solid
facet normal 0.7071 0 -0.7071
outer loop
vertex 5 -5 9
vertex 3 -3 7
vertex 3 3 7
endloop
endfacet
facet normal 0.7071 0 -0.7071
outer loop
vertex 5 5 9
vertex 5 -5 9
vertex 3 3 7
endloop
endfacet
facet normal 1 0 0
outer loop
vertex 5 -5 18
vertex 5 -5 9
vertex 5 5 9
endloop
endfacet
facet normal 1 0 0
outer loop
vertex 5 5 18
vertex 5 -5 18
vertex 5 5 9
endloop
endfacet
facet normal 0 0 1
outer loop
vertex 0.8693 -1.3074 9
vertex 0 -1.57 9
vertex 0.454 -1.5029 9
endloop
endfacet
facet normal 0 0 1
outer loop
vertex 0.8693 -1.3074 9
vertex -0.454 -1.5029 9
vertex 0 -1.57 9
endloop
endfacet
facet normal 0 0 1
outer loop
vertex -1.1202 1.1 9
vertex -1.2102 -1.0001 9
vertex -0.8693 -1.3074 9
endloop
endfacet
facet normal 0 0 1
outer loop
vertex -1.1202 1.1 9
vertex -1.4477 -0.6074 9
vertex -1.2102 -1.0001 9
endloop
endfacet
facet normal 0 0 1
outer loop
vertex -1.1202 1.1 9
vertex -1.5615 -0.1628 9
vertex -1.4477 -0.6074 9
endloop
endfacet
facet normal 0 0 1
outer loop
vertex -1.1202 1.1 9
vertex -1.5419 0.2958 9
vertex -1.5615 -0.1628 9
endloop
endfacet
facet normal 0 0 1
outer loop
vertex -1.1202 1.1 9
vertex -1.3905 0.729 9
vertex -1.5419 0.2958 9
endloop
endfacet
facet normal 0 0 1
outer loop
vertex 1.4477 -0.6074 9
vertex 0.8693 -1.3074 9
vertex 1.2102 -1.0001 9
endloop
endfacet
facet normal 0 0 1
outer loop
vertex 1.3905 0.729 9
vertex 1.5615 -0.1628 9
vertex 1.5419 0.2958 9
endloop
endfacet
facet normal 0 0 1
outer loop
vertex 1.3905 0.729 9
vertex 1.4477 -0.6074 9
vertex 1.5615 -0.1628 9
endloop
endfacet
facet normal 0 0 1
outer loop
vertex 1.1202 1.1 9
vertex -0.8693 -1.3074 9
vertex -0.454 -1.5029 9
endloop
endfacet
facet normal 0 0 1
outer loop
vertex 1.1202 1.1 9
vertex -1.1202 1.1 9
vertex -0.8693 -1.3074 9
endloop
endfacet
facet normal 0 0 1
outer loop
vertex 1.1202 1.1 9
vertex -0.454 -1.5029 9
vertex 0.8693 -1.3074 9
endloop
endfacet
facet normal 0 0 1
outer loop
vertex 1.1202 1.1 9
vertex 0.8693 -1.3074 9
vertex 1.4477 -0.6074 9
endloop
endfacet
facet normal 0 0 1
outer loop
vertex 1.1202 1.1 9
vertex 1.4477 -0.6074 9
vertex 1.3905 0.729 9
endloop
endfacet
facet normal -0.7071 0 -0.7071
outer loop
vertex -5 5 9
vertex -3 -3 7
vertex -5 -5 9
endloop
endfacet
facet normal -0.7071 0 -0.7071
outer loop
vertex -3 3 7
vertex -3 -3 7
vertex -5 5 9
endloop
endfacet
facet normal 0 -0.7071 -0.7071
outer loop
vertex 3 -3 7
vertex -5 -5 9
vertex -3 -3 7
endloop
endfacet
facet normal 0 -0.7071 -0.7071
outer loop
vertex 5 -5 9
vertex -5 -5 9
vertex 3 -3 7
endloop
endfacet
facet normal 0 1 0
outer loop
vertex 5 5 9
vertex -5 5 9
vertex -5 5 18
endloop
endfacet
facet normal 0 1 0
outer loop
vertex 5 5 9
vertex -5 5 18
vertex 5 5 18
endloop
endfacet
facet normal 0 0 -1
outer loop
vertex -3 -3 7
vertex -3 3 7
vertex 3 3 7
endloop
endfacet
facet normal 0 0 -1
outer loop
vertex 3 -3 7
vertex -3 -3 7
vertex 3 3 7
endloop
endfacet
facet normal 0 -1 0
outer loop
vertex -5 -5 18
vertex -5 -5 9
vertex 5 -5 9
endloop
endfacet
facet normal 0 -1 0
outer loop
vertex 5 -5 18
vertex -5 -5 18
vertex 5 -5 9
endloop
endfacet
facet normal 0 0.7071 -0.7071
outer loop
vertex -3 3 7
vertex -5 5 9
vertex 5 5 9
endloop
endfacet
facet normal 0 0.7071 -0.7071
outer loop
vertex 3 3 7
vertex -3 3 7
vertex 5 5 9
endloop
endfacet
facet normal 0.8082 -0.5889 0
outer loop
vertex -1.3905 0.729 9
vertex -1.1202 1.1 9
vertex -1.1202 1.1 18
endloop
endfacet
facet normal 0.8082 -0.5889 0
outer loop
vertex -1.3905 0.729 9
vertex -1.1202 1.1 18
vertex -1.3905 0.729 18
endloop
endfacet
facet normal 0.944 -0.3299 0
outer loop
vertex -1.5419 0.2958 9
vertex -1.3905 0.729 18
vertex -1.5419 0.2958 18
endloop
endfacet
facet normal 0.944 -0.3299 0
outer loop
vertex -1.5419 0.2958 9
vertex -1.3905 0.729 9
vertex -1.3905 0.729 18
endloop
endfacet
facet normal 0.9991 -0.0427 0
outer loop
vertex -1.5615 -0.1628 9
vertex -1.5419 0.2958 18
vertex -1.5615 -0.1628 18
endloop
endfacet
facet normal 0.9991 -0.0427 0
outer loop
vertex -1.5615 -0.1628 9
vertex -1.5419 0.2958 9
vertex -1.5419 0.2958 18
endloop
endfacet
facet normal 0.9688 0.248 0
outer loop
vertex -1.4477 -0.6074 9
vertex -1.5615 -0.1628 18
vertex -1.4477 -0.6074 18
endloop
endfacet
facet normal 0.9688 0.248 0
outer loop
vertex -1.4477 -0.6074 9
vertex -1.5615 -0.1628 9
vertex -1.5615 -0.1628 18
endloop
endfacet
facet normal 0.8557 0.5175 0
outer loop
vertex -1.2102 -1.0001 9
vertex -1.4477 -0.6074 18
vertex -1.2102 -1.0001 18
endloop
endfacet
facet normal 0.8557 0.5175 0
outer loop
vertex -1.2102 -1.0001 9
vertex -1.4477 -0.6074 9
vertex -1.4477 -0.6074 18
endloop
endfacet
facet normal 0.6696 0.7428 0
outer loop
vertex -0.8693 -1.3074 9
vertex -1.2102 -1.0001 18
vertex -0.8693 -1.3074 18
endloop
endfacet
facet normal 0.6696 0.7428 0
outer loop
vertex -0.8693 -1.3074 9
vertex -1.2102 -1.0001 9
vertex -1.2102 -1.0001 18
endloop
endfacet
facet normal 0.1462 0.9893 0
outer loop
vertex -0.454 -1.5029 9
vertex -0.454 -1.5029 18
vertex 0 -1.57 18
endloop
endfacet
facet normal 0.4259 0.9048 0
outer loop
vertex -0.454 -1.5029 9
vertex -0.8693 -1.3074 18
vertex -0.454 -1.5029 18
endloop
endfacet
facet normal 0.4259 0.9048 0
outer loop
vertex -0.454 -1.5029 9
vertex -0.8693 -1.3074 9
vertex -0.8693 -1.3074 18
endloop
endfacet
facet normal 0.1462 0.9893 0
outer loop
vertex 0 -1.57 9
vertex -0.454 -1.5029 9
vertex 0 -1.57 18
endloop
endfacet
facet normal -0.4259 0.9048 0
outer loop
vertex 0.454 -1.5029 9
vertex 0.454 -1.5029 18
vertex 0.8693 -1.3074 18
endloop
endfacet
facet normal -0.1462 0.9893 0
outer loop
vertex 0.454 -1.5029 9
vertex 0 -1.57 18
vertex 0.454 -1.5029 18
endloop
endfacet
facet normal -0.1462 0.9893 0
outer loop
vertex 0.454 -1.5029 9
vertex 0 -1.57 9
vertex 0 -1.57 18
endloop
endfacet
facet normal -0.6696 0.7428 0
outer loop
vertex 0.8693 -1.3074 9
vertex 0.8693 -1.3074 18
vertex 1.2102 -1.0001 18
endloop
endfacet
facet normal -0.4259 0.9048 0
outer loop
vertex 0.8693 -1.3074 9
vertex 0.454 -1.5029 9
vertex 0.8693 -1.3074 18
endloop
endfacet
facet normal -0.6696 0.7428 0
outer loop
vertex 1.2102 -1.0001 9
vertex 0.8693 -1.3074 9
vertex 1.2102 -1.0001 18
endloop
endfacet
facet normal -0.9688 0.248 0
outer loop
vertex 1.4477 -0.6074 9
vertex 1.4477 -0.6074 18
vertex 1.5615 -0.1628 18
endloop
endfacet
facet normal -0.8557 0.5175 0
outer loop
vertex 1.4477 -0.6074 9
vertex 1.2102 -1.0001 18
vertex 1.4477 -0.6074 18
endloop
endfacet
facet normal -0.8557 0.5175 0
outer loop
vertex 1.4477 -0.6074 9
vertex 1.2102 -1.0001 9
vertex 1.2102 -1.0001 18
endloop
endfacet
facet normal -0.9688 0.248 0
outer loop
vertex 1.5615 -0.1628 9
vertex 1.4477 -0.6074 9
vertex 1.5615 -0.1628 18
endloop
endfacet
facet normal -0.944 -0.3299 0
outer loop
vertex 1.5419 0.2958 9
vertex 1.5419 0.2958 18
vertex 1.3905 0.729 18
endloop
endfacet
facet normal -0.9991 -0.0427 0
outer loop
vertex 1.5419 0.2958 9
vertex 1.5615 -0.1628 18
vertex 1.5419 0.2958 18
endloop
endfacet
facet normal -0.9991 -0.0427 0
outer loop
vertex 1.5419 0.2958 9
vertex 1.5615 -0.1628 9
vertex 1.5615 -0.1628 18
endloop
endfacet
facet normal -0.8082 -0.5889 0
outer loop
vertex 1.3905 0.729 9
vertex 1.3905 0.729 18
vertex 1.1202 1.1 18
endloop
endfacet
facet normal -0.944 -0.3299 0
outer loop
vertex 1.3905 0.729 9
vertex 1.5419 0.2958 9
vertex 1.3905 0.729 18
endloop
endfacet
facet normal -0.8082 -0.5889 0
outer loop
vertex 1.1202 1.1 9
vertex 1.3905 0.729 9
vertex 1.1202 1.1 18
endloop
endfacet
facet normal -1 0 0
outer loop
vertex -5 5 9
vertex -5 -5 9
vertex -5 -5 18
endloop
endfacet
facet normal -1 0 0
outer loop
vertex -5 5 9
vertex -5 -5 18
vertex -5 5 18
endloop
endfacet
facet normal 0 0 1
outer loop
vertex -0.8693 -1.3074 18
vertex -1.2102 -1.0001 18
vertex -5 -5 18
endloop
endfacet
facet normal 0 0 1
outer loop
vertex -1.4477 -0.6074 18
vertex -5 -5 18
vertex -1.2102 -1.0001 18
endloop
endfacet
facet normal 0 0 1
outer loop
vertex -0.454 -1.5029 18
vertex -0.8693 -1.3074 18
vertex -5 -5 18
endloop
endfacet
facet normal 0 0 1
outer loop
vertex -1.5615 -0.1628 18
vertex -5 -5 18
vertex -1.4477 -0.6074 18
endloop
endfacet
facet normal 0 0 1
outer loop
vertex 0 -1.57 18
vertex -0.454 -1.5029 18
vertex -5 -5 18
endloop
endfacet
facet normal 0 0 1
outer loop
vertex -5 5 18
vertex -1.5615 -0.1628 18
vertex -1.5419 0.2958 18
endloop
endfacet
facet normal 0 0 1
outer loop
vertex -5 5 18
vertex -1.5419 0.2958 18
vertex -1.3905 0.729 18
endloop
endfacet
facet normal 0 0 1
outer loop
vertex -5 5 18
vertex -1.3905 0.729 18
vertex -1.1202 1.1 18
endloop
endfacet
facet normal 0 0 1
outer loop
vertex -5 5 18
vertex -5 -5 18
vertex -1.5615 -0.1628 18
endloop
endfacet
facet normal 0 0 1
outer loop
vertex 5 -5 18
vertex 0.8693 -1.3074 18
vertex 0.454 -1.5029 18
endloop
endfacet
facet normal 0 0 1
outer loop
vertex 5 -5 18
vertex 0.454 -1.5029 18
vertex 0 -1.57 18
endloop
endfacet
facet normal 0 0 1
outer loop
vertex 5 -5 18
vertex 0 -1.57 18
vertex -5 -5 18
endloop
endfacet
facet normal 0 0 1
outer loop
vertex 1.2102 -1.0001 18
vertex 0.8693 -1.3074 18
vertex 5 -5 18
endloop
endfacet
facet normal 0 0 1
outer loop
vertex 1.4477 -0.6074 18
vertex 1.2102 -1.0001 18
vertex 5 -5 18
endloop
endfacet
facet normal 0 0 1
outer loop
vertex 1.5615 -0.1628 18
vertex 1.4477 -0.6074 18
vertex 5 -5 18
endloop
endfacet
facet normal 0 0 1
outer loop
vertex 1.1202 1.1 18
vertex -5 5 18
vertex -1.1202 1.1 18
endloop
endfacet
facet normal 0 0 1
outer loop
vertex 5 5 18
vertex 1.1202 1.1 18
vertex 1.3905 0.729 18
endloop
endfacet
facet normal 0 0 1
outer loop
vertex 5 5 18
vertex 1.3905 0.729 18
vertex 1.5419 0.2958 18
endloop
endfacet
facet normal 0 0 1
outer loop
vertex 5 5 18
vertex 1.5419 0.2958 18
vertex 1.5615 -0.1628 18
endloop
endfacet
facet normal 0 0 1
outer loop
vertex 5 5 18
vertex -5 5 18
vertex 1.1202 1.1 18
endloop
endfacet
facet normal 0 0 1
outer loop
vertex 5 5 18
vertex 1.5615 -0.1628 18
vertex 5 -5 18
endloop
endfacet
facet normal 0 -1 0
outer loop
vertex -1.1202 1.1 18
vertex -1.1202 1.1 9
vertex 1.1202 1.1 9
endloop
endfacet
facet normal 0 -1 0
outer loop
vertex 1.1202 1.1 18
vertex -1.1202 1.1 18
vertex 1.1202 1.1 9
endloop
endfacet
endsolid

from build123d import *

# Parameters (mm, degrees)
BOX406008008_W     = 10
BOX406008008_H     = 10
BOX406008008_DEPTH = 19
CYLINDER079_R      = 1.57
CYLINDER079_DEPTH  = 17
BOX406008009_W     = 10
BOX406008009_H     = 10
BOX406008009_DEPTH = 11
CHAMFER004_SIZE    = 2


with BuildPart() as cube343:
    # Box406008008 → Box406008008 (new body)
    with BuildSketch(Plane(origin=(-5, 1.1, 1.5), x_dir=(1, 0, 0), z_dir=(0, 0, 1))):
        with Locations((5, 5)):
            Rectangle(BOX406008008_W, BOX406008008_H)
    extrude(amount=BOX406008008_DEPTH)


with BuildPart() as motor_shaft_hole:
    # Cylinder079 → Cylinder079 (new body)
    with BuildSketch(Plane.XY.offset(9)):
        Circle(CYLINDER079_R)
    extrude(amount=CYLINDER079_DEPTH)

    # Cut064: cut Cube343
    add(cube343.part, mode=Mode.SUBTRACT)


with BuildPart() as square_peg001:
    # Box406008009 → Box406008009 (new body)
    with BuildSketch(Plane(origin=(-5, -5, 7), x_dir=(1, 0, 0), z_dir=(0, 0, 1))):
        with Locations((5, 5)):
            Rectangle(BOX406008009_W, BOX406008009_H)
    extrude(amount=BOX406008009_DEPTH)

    # Cut065: cut Motor Shaft Hole
    add(motor_shaft_hole.part, mode=Mode.SUBTRACT)

    # Chamfer004
    chamfer004_edges = [square_peg001.edges().sort_by_distance(p)[0] for p in [
        (-5, 0, 7),
        (0, -5, 7),
        (0, 5, 7),
        (5, 0, 7),
    ]]
    chamfer(chamfer004_edges, length=CHAMFER004_SIZE)


solid = square_peg001.part
